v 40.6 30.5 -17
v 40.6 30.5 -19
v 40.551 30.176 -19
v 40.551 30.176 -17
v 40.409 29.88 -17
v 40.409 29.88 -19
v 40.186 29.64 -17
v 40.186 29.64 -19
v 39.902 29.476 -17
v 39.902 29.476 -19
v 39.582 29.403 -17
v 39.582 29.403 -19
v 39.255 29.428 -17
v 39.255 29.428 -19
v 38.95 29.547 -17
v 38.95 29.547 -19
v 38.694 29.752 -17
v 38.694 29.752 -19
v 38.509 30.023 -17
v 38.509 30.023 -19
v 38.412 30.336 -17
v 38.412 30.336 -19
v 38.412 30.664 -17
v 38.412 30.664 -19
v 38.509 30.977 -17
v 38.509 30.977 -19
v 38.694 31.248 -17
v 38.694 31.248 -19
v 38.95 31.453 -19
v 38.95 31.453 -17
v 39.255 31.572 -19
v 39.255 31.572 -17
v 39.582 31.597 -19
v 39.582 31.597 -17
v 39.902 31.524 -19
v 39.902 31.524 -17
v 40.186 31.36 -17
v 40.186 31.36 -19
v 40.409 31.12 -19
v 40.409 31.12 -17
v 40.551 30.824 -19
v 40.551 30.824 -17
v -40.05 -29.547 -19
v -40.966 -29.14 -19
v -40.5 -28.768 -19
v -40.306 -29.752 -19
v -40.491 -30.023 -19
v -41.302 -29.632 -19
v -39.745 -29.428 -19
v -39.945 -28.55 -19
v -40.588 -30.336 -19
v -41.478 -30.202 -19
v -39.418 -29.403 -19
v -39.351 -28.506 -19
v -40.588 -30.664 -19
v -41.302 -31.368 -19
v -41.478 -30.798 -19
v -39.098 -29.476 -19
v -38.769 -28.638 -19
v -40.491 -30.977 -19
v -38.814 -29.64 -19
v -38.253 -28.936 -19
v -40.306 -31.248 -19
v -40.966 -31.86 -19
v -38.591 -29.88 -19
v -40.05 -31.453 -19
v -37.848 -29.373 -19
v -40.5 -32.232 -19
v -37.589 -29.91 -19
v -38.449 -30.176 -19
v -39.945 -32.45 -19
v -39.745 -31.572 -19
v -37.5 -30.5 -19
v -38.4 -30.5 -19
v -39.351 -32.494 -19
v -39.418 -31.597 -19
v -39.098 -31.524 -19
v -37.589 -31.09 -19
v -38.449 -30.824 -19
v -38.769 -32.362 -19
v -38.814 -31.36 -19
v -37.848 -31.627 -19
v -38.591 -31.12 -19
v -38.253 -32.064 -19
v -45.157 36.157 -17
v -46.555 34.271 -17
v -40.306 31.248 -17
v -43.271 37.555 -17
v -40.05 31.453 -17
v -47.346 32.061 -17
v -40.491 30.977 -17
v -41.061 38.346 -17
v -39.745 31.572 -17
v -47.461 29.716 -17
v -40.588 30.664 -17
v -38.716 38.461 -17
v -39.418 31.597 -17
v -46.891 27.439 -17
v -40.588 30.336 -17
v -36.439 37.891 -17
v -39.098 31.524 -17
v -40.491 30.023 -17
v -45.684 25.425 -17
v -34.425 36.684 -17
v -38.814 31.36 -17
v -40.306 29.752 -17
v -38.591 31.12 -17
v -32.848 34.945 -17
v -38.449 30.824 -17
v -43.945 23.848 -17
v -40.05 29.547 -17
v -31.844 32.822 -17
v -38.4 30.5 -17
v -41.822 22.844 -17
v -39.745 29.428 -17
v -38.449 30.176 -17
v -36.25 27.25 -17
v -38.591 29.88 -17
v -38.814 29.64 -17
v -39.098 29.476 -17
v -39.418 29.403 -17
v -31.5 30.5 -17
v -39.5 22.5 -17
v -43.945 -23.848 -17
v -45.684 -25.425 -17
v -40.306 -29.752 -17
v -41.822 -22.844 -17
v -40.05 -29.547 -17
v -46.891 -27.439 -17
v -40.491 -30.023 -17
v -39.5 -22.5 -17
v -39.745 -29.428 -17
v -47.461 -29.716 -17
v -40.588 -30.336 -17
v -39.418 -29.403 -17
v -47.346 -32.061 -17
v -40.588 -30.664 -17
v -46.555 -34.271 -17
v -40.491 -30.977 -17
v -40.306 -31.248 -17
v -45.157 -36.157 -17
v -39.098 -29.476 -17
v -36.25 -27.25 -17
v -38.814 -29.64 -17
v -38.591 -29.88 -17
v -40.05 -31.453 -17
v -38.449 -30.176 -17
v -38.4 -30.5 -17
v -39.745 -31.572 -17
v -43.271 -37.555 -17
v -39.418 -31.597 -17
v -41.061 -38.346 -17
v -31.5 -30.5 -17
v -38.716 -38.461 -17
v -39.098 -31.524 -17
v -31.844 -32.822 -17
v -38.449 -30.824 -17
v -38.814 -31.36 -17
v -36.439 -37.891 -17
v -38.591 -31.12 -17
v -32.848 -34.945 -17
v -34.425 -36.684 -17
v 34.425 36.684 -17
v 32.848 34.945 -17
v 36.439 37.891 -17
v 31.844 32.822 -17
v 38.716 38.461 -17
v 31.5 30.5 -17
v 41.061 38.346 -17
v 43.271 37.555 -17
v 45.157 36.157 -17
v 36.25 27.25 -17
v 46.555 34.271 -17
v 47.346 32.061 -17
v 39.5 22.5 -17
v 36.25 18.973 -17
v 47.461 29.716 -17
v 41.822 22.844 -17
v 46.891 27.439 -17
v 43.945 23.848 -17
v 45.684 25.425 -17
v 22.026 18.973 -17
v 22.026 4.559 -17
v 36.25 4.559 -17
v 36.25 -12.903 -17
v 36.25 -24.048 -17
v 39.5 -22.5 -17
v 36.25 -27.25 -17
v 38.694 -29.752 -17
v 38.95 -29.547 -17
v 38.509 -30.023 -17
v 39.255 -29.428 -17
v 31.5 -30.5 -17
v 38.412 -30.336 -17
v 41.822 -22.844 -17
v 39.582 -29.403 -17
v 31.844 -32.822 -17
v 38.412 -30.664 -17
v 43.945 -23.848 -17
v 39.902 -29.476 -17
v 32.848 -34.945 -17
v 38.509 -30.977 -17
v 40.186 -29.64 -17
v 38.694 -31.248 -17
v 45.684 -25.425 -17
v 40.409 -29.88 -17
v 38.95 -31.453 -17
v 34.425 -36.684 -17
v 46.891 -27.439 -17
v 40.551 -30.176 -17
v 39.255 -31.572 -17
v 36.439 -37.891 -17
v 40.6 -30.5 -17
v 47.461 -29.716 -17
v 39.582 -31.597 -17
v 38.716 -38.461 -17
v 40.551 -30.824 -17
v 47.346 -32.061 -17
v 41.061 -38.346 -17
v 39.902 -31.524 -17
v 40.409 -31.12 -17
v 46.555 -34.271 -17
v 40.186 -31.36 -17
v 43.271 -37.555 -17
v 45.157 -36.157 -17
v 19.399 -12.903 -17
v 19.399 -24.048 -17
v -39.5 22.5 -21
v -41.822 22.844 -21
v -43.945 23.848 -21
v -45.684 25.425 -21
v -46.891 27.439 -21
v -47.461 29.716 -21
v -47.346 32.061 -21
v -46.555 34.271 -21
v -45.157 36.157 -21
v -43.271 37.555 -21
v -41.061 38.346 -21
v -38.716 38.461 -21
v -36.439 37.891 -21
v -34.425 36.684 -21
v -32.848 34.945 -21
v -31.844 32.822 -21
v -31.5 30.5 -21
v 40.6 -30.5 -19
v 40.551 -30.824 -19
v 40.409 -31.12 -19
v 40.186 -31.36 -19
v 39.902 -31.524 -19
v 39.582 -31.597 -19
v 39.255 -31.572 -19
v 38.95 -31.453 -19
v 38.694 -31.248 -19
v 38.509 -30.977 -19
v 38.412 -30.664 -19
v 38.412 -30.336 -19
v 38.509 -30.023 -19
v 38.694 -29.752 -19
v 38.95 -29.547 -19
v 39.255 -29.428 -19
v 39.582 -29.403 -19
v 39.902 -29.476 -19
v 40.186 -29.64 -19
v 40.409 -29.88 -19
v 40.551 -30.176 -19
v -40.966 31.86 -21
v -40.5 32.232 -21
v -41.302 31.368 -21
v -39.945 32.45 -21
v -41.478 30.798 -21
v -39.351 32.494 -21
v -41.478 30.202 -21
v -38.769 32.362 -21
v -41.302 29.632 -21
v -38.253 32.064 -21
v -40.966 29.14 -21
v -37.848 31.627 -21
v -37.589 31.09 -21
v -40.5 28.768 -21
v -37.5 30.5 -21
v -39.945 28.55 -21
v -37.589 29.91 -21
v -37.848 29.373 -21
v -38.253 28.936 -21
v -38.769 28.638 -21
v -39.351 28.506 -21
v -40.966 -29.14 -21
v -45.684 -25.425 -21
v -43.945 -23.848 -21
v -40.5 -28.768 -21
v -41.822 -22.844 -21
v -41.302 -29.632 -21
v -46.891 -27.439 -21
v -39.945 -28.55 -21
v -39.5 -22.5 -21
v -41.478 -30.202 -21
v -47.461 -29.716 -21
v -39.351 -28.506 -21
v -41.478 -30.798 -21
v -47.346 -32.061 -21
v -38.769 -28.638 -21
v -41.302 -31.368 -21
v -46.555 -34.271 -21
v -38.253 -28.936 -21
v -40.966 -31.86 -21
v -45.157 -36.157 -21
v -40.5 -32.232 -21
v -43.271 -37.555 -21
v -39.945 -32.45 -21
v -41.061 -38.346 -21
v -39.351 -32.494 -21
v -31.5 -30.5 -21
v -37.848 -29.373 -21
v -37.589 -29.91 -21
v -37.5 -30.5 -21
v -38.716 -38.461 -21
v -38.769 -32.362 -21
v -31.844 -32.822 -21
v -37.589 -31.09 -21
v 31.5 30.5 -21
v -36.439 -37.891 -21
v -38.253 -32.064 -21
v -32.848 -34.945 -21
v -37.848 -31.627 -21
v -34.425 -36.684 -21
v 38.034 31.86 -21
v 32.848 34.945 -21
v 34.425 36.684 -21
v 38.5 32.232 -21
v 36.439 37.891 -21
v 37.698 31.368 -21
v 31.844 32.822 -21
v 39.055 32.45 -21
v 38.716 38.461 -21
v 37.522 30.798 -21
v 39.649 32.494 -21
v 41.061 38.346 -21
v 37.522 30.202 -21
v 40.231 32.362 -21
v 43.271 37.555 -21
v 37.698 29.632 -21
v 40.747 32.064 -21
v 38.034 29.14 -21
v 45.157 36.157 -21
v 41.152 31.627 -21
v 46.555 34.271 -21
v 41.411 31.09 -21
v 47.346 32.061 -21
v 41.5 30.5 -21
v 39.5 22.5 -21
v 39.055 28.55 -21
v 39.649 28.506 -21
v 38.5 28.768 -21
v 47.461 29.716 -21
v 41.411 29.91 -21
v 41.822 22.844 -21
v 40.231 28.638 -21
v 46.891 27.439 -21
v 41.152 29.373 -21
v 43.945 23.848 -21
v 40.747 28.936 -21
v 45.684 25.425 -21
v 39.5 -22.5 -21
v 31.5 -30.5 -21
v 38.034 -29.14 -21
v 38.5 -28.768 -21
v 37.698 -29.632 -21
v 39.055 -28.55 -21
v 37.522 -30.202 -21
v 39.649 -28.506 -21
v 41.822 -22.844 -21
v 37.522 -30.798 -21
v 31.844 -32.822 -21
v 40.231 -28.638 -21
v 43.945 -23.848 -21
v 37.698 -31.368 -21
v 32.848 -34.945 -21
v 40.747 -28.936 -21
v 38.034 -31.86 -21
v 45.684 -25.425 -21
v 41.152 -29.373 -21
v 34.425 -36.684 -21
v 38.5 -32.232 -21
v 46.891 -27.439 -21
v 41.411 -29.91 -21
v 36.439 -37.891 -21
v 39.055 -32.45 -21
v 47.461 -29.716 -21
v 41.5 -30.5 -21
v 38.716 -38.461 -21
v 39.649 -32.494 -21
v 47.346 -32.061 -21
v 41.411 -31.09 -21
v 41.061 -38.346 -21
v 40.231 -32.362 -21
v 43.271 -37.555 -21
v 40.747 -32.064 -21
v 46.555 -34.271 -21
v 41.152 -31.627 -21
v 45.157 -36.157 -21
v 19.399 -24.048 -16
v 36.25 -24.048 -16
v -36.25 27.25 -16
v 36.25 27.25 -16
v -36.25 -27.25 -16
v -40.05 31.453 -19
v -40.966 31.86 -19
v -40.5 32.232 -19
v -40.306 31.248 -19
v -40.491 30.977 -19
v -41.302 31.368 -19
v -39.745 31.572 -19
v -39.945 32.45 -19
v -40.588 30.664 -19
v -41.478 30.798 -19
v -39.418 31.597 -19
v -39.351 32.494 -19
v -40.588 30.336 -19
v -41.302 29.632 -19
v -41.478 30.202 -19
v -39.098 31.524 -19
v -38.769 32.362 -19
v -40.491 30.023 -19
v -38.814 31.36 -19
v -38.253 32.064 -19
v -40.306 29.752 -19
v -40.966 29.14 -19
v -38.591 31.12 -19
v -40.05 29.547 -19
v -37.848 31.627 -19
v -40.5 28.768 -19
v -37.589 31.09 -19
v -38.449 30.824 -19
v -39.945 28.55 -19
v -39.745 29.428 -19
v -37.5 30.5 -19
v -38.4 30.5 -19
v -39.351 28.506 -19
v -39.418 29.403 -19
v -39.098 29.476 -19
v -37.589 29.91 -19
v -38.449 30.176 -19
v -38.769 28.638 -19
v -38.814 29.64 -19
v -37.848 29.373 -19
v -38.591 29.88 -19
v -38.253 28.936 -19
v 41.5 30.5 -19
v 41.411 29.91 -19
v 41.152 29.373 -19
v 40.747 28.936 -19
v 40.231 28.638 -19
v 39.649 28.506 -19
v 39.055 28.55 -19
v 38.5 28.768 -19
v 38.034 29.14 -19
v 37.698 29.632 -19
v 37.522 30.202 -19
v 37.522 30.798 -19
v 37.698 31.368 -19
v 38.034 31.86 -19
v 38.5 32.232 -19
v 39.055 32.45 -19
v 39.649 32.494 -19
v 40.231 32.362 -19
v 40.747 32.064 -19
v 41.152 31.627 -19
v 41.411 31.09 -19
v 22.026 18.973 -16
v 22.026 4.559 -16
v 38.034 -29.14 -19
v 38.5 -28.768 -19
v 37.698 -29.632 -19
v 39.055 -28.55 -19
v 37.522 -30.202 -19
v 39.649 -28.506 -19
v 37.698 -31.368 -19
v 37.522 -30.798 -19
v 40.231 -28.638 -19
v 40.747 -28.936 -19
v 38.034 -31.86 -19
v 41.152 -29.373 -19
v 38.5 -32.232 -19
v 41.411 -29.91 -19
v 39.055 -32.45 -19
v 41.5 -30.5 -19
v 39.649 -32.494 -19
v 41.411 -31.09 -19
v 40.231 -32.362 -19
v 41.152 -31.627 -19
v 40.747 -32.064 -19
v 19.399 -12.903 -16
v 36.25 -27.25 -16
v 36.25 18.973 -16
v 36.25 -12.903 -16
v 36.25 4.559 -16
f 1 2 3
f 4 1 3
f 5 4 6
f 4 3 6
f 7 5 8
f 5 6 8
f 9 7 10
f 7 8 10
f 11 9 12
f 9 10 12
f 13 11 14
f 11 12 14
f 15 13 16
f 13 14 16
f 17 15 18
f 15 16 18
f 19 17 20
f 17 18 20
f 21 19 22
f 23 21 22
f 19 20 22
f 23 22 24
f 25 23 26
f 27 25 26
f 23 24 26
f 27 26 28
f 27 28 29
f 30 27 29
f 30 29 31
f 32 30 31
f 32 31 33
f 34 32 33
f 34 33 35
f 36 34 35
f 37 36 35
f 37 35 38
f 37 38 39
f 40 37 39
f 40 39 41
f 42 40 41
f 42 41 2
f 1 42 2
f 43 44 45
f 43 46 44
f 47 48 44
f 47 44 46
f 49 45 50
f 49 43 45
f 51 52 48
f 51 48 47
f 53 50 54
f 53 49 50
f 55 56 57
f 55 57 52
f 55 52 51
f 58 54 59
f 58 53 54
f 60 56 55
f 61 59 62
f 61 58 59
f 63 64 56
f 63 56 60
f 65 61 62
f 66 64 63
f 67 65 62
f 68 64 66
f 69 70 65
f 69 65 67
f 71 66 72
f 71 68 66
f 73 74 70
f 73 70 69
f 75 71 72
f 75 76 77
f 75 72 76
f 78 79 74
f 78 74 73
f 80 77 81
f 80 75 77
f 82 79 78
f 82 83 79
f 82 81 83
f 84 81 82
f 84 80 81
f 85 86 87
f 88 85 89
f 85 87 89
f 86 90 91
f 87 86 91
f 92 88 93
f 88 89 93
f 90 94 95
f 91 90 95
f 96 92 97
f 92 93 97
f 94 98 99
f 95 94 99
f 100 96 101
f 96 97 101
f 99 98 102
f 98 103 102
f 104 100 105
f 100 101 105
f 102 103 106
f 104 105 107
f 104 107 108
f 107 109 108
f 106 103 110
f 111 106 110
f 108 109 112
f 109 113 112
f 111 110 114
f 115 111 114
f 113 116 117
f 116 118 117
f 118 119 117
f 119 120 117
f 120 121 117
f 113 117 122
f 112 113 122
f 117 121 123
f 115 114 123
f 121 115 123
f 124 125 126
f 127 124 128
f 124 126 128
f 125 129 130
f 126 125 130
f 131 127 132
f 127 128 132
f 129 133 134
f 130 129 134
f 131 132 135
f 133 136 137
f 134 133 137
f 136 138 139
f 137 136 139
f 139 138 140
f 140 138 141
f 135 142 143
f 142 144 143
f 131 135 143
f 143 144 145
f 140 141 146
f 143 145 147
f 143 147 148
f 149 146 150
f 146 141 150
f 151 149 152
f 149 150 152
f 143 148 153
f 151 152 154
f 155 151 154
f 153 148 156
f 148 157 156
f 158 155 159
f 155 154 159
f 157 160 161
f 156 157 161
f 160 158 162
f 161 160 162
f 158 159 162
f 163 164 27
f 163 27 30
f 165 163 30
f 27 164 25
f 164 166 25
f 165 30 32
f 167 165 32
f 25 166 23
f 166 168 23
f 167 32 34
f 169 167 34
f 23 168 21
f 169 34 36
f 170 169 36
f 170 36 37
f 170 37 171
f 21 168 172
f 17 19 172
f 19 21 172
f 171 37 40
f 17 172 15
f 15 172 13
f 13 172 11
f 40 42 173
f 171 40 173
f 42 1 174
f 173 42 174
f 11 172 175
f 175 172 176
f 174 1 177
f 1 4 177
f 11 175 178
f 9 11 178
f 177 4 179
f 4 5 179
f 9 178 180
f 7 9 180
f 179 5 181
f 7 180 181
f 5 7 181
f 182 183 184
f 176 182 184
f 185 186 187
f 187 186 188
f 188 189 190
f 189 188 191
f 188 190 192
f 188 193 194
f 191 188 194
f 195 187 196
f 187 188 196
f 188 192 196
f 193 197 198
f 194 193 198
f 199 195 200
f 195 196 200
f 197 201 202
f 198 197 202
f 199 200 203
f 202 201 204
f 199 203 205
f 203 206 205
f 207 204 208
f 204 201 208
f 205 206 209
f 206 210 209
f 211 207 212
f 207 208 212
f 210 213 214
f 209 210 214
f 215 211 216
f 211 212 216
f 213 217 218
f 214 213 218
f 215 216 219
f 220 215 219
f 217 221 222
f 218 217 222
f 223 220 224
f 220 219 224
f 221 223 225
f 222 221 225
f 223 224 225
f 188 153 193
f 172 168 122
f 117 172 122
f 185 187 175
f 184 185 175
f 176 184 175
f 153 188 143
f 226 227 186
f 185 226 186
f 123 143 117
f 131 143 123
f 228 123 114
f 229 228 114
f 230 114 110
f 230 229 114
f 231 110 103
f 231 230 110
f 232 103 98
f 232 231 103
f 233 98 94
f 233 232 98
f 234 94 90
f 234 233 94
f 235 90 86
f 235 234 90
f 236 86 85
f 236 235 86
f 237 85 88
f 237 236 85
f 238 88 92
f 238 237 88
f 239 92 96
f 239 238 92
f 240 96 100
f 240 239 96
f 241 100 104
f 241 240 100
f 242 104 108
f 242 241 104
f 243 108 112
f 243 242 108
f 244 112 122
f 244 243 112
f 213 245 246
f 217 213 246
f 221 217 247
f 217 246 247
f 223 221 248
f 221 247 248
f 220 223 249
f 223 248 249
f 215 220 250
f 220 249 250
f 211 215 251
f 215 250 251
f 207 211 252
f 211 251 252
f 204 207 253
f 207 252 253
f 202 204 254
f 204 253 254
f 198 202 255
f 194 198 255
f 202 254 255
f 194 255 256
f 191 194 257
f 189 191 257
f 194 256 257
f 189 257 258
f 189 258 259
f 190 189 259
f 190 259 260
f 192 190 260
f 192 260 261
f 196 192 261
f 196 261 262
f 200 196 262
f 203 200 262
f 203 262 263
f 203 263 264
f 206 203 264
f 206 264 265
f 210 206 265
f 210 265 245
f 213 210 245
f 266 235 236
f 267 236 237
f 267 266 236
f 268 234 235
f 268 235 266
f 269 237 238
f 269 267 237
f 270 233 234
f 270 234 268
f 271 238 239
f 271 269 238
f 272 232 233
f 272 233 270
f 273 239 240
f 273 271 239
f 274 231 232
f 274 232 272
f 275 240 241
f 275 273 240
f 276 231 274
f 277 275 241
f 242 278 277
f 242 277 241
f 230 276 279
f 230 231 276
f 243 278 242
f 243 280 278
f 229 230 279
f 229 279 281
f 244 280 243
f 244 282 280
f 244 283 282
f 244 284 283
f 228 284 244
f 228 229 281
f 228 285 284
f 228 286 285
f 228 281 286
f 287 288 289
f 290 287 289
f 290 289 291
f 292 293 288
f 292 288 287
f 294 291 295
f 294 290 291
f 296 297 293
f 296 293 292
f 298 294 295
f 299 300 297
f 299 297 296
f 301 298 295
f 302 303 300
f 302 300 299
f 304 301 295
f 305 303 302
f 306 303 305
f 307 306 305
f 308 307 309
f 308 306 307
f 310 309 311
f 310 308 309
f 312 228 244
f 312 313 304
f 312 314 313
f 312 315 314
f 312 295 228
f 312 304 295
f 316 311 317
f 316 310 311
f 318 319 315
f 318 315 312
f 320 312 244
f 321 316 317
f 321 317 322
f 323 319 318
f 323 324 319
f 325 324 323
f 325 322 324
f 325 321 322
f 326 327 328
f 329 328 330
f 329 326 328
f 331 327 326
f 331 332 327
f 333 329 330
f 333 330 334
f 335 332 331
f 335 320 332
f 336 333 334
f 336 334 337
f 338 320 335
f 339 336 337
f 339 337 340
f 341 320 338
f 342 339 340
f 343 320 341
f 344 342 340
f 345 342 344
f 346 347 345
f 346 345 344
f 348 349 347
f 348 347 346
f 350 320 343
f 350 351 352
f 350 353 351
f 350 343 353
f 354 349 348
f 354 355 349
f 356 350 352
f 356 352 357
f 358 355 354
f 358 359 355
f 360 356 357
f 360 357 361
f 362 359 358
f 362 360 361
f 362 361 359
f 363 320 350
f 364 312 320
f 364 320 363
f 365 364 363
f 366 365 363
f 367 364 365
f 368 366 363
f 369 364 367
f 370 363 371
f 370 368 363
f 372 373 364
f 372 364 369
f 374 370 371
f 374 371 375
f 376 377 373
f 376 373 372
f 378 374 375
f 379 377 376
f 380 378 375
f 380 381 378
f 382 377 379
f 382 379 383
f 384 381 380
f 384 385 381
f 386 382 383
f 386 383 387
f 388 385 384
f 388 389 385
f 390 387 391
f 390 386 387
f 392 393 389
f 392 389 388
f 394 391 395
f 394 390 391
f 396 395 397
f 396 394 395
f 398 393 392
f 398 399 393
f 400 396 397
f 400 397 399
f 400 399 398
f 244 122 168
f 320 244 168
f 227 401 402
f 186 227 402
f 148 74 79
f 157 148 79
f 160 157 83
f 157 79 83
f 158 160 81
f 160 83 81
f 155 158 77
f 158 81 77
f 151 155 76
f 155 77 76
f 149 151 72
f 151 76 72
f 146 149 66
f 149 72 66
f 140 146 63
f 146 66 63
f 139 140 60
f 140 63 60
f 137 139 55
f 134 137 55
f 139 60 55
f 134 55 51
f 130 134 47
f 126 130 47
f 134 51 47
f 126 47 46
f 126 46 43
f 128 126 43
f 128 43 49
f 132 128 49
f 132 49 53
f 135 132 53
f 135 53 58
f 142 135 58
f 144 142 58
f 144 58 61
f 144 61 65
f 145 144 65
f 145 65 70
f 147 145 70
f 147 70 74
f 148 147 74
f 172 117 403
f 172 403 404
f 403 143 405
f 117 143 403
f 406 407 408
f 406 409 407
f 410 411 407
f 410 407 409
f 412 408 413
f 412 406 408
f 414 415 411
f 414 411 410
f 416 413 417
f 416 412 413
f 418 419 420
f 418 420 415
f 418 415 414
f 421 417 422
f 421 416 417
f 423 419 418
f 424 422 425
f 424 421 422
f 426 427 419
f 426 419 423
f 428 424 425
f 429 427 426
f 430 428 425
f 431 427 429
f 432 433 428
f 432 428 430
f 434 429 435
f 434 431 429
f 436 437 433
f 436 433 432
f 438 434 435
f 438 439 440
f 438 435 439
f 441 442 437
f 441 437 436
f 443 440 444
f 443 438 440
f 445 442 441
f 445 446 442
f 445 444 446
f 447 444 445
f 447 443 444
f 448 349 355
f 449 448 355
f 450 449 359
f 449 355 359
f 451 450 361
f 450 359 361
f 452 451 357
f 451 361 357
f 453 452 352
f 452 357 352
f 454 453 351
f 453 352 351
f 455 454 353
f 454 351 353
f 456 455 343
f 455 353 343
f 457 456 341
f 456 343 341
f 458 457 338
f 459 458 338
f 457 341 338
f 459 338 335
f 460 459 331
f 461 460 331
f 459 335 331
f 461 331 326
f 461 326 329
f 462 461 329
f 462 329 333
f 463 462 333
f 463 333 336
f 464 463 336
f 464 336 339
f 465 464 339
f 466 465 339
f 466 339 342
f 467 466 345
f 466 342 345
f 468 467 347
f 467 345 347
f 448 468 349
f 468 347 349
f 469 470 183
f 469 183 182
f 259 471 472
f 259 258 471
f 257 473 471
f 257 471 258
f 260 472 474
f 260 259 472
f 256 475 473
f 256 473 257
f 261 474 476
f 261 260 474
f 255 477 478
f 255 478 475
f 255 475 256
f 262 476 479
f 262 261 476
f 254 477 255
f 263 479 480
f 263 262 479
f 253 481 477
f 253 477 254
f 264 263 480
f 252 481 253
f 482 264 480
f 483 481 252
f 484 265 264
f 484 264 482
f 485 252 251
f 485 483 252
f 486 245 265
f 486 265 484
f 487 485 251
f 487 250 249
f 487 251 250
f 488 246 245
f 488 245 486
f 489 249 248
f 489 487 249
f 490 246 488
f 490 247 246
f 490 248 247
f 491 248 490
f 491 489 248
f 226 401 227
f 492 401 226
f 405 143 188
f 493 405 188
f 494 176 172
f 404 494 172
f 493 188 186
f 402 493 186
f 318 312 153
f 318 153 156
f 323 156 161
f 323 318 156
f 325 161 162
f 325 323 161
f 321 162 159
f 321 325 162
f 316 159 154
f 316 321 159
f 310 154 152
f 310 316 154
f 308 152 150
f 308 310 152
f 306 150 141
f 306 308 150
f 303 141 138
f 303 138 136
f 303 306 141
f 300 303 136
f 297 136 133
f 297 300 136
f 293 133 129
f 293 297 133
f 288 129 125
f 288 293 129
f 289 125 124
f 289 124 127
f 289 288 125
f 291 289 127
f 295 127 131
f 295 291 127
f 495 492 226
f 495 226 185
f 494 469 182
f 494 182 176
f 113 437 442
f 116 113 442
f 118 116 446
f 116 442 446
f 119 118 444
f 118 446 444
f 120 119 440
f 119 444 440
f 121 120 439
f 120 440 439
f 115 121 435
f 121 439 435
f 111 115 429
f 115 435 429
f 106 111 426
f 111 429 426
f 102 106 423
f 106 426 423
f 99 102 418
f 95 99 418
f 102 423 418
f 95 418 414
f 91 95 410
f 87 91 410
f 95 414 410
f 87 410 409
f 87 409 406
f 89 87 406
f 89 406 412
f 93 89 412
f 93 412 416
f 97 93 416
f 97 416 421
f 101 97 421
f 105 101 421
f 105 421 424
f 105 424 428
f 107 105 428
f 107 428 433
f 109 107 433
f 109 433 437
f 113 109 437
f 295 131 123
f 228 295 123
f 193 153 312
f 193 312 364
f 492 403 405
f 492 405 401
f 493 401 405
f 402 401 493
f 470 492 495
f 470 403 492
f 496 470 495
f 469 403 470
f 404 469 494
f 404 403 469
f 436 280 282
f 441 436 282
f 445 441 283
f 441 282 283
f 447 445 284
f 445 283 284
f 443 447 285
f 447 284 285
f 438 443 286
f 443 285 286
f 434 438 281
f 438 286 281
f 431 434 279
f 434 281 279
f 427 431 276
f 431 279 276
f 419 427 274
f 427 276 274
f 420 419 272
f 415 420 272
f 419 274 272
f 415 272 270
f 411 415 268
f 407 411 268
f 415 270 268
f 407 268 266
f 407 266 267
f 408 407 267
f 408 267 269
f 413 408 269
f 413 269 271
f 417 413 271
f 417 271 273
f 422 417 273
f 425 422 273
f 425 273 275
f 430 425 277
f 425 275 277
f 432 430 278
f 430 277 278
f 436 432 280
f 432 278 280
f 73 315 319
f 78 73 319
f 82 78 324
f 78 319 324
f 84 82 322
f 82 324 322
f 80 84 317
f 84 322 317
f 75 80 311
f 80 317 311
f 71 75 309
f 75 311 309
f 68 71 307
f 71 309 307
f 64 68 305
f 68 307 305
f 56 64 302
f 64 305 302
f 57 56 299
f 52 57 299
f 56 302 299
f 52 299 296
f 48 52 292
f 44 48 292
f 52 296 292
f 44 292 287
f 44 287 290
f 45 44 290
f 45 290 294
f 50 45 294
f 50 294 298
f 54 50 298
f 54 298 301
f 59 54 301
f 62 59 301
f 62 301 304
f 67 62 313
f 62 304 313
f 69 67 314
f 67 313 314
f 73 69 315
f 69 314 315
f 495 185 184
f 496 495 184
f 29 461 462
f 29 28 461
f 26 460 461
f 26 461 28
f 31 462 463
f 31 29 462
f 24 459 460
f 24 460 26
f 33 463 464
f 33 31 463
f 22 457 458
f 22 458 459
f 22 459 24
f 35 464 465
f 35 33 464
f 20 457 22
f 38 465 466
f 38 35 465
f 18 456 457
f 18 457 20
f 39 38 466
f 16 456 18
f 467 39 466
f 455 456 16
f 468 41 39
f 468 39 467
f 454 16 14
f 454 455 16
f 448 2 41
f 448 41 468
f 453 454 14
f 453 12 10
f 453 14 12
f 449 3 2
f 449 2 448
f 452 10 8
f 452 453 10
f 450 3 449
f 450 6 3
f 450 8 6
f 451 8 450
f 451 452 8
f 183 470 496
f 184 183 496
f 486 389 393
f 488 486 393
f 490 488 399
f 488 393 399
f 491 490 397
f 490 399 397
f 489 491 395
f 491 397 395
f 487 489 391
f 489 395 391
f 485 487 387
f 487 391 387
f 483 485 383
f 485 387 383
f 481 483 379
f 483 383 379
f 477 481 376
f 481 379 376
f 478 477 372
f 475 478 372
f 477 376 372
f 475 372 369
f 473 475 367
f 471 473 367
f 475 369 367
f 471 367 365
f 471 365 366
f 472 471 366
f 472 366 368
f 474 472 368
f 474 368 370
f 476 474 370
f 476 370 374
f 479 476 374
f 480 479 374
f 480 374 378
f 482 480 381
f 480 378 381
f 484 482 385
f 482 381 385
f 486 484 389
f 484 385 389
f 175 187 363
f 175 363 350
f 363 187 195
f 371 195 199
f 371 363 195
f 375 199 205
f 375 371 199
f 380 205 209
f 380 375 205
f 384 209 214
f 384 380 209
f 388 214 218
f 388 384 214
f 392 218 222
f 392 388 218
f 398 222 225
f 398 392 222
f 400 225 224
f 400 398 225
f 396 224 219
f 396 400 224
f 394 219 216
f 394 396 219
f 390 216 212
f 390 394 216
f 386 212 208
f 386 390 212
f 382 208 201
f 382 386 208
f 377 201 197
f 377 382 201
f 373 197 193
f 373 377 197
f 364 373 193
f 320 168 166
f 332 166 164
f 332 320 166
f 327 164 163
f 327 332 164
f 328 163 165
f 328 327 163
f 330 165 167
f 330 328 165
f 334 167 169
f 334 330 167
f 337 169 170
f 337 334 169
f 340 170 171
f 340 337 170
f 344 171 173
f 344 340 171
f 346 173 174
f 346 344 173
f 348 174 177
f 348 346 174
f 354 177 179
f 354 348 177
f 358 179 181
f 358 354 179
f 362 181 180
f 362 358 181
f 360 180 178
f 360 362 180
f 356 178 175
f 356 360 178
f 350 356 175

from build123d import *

# Parameters (mm, degrees)
SKETCH024_W     = 79
SKETCH024_H     = 61
PAD006_DEPTH    = 4
SKETCH025_W     = 72.5
SKETCH025_H     = 54.5
PAD007_DEPTH    = 1
SKETCH026_W     = 14.223953
SKETCH026_H     = 14.414499
SKETCH026_W_2   = 16.850891
SKETCH026_H_2   = 11.145231
POCKET015_DEPTH = 1
SKETCH029_R     = 8
PAD010_DEPTH    = 4
SKETCH030_R     = 1.1
POCKET016_DEPTH = 5.001
SKETCH031_R     = 2
POCKET017_DEPTH = 2


with BuildPart() as part:
    # Sketch024 → Pad006 (new body)
    with BuildSketch(Plane.XY):
        Rectangle(SKETCH024_W, SKETCH024_H)
    extrude(amount=-PAD006_DEPTH)

    # Sketch025 (on Face5 of Pad006) → Pad007 (join)
    with BuildSketch(Plane.XY):
        Rectangle(SKETCH025_W, SKETCH025_H)
    extrude(amount=PAD007_DEPTH)

    # Sketch026 (on Face11 of Pad007) → Pocket015 (cut)
    with BuildSketch(Plane.XY.offset(1)):
        with Locations((29.1380235, 11.7657555)):
            Rectangle(SKETCH026_W, SKETCH026_H)
        with Locations((27.8245545, -18.4755795)):
            Rectangle(SKETCH026_W_2, SKETCH026_H_2)
    extrude(amount=-POCKET015_DEPTH, mode=Mode.SUBTRACT)

    # Sketch029 (on Face5 of Pocket015) → Pad010 (join)
    with BuildSketch(Plane(origin=(0, 0, -4), x_dir=(1, 0, 0), z_dir=(0, 0, -1))):
        with Locations((39.5, 30.5)):
            Circle(SKETCH029_R)
        with Locations((39.5, -30.5)):
            Circle(SKETCH029_R)
        with Locations((-39.5, -30.5)):
            Circle(SKETCH029_R)
        with Locations((-39.5, 30.5)):
            Circle(SKETCH029_R)
    extrude(amount=-PAD010_DEPTH)

    # Sketch030 (on Face20 of Pad010) → Pocket016 (cut, through all)
    with BuildSketch(Plane(origin=(0, 0, -4), x_dir=(1, 0, 0), z_dir=(0, 0, -1))):
        with Locations((39.5, 30.5)):
            Circle(SKETCH030_R)
        with Locations((39.5, -30.5)):
            Circle(SKETCH030_R)
        with Locations((-39.5, -30.5)):
            Circle(SKETCH030_R)
        with Locations((-39.5, 30.5)):
            Circle(SKETCH030_R)
    extrude(amount=-POCKET016_DEPTH, mode=Mode.SUBTRACT)

    # Sketch031 (on Face22 of Pocket016) → Pocket017 (cut)
    with BuildSketch(Plane(origin=(0, 0, -4), x_dir=(1, 0, 0), z_dir=(0, 0, -1))):
        with Locations((-39.5, 30.5)):
            Circle(SKETCH031_R)
        with Locations((-39.5, -30.5)):
            Circle(SKETCH031_R)
        with Locations((39.5, 30.5)):
            Circle(SKETCH031_R)
        with Locations((39.5, -30.5)):
            Circle(SKETCH031_R)
    extrude(amount=-POCKET017_DEPTH, mode=Mode.SUBTRACT)


with BuildPart() as part_1:
    # Body002 placement: moved
    add(part.part.moved(Location((0, 0, -17))))


solid = part_1.part
